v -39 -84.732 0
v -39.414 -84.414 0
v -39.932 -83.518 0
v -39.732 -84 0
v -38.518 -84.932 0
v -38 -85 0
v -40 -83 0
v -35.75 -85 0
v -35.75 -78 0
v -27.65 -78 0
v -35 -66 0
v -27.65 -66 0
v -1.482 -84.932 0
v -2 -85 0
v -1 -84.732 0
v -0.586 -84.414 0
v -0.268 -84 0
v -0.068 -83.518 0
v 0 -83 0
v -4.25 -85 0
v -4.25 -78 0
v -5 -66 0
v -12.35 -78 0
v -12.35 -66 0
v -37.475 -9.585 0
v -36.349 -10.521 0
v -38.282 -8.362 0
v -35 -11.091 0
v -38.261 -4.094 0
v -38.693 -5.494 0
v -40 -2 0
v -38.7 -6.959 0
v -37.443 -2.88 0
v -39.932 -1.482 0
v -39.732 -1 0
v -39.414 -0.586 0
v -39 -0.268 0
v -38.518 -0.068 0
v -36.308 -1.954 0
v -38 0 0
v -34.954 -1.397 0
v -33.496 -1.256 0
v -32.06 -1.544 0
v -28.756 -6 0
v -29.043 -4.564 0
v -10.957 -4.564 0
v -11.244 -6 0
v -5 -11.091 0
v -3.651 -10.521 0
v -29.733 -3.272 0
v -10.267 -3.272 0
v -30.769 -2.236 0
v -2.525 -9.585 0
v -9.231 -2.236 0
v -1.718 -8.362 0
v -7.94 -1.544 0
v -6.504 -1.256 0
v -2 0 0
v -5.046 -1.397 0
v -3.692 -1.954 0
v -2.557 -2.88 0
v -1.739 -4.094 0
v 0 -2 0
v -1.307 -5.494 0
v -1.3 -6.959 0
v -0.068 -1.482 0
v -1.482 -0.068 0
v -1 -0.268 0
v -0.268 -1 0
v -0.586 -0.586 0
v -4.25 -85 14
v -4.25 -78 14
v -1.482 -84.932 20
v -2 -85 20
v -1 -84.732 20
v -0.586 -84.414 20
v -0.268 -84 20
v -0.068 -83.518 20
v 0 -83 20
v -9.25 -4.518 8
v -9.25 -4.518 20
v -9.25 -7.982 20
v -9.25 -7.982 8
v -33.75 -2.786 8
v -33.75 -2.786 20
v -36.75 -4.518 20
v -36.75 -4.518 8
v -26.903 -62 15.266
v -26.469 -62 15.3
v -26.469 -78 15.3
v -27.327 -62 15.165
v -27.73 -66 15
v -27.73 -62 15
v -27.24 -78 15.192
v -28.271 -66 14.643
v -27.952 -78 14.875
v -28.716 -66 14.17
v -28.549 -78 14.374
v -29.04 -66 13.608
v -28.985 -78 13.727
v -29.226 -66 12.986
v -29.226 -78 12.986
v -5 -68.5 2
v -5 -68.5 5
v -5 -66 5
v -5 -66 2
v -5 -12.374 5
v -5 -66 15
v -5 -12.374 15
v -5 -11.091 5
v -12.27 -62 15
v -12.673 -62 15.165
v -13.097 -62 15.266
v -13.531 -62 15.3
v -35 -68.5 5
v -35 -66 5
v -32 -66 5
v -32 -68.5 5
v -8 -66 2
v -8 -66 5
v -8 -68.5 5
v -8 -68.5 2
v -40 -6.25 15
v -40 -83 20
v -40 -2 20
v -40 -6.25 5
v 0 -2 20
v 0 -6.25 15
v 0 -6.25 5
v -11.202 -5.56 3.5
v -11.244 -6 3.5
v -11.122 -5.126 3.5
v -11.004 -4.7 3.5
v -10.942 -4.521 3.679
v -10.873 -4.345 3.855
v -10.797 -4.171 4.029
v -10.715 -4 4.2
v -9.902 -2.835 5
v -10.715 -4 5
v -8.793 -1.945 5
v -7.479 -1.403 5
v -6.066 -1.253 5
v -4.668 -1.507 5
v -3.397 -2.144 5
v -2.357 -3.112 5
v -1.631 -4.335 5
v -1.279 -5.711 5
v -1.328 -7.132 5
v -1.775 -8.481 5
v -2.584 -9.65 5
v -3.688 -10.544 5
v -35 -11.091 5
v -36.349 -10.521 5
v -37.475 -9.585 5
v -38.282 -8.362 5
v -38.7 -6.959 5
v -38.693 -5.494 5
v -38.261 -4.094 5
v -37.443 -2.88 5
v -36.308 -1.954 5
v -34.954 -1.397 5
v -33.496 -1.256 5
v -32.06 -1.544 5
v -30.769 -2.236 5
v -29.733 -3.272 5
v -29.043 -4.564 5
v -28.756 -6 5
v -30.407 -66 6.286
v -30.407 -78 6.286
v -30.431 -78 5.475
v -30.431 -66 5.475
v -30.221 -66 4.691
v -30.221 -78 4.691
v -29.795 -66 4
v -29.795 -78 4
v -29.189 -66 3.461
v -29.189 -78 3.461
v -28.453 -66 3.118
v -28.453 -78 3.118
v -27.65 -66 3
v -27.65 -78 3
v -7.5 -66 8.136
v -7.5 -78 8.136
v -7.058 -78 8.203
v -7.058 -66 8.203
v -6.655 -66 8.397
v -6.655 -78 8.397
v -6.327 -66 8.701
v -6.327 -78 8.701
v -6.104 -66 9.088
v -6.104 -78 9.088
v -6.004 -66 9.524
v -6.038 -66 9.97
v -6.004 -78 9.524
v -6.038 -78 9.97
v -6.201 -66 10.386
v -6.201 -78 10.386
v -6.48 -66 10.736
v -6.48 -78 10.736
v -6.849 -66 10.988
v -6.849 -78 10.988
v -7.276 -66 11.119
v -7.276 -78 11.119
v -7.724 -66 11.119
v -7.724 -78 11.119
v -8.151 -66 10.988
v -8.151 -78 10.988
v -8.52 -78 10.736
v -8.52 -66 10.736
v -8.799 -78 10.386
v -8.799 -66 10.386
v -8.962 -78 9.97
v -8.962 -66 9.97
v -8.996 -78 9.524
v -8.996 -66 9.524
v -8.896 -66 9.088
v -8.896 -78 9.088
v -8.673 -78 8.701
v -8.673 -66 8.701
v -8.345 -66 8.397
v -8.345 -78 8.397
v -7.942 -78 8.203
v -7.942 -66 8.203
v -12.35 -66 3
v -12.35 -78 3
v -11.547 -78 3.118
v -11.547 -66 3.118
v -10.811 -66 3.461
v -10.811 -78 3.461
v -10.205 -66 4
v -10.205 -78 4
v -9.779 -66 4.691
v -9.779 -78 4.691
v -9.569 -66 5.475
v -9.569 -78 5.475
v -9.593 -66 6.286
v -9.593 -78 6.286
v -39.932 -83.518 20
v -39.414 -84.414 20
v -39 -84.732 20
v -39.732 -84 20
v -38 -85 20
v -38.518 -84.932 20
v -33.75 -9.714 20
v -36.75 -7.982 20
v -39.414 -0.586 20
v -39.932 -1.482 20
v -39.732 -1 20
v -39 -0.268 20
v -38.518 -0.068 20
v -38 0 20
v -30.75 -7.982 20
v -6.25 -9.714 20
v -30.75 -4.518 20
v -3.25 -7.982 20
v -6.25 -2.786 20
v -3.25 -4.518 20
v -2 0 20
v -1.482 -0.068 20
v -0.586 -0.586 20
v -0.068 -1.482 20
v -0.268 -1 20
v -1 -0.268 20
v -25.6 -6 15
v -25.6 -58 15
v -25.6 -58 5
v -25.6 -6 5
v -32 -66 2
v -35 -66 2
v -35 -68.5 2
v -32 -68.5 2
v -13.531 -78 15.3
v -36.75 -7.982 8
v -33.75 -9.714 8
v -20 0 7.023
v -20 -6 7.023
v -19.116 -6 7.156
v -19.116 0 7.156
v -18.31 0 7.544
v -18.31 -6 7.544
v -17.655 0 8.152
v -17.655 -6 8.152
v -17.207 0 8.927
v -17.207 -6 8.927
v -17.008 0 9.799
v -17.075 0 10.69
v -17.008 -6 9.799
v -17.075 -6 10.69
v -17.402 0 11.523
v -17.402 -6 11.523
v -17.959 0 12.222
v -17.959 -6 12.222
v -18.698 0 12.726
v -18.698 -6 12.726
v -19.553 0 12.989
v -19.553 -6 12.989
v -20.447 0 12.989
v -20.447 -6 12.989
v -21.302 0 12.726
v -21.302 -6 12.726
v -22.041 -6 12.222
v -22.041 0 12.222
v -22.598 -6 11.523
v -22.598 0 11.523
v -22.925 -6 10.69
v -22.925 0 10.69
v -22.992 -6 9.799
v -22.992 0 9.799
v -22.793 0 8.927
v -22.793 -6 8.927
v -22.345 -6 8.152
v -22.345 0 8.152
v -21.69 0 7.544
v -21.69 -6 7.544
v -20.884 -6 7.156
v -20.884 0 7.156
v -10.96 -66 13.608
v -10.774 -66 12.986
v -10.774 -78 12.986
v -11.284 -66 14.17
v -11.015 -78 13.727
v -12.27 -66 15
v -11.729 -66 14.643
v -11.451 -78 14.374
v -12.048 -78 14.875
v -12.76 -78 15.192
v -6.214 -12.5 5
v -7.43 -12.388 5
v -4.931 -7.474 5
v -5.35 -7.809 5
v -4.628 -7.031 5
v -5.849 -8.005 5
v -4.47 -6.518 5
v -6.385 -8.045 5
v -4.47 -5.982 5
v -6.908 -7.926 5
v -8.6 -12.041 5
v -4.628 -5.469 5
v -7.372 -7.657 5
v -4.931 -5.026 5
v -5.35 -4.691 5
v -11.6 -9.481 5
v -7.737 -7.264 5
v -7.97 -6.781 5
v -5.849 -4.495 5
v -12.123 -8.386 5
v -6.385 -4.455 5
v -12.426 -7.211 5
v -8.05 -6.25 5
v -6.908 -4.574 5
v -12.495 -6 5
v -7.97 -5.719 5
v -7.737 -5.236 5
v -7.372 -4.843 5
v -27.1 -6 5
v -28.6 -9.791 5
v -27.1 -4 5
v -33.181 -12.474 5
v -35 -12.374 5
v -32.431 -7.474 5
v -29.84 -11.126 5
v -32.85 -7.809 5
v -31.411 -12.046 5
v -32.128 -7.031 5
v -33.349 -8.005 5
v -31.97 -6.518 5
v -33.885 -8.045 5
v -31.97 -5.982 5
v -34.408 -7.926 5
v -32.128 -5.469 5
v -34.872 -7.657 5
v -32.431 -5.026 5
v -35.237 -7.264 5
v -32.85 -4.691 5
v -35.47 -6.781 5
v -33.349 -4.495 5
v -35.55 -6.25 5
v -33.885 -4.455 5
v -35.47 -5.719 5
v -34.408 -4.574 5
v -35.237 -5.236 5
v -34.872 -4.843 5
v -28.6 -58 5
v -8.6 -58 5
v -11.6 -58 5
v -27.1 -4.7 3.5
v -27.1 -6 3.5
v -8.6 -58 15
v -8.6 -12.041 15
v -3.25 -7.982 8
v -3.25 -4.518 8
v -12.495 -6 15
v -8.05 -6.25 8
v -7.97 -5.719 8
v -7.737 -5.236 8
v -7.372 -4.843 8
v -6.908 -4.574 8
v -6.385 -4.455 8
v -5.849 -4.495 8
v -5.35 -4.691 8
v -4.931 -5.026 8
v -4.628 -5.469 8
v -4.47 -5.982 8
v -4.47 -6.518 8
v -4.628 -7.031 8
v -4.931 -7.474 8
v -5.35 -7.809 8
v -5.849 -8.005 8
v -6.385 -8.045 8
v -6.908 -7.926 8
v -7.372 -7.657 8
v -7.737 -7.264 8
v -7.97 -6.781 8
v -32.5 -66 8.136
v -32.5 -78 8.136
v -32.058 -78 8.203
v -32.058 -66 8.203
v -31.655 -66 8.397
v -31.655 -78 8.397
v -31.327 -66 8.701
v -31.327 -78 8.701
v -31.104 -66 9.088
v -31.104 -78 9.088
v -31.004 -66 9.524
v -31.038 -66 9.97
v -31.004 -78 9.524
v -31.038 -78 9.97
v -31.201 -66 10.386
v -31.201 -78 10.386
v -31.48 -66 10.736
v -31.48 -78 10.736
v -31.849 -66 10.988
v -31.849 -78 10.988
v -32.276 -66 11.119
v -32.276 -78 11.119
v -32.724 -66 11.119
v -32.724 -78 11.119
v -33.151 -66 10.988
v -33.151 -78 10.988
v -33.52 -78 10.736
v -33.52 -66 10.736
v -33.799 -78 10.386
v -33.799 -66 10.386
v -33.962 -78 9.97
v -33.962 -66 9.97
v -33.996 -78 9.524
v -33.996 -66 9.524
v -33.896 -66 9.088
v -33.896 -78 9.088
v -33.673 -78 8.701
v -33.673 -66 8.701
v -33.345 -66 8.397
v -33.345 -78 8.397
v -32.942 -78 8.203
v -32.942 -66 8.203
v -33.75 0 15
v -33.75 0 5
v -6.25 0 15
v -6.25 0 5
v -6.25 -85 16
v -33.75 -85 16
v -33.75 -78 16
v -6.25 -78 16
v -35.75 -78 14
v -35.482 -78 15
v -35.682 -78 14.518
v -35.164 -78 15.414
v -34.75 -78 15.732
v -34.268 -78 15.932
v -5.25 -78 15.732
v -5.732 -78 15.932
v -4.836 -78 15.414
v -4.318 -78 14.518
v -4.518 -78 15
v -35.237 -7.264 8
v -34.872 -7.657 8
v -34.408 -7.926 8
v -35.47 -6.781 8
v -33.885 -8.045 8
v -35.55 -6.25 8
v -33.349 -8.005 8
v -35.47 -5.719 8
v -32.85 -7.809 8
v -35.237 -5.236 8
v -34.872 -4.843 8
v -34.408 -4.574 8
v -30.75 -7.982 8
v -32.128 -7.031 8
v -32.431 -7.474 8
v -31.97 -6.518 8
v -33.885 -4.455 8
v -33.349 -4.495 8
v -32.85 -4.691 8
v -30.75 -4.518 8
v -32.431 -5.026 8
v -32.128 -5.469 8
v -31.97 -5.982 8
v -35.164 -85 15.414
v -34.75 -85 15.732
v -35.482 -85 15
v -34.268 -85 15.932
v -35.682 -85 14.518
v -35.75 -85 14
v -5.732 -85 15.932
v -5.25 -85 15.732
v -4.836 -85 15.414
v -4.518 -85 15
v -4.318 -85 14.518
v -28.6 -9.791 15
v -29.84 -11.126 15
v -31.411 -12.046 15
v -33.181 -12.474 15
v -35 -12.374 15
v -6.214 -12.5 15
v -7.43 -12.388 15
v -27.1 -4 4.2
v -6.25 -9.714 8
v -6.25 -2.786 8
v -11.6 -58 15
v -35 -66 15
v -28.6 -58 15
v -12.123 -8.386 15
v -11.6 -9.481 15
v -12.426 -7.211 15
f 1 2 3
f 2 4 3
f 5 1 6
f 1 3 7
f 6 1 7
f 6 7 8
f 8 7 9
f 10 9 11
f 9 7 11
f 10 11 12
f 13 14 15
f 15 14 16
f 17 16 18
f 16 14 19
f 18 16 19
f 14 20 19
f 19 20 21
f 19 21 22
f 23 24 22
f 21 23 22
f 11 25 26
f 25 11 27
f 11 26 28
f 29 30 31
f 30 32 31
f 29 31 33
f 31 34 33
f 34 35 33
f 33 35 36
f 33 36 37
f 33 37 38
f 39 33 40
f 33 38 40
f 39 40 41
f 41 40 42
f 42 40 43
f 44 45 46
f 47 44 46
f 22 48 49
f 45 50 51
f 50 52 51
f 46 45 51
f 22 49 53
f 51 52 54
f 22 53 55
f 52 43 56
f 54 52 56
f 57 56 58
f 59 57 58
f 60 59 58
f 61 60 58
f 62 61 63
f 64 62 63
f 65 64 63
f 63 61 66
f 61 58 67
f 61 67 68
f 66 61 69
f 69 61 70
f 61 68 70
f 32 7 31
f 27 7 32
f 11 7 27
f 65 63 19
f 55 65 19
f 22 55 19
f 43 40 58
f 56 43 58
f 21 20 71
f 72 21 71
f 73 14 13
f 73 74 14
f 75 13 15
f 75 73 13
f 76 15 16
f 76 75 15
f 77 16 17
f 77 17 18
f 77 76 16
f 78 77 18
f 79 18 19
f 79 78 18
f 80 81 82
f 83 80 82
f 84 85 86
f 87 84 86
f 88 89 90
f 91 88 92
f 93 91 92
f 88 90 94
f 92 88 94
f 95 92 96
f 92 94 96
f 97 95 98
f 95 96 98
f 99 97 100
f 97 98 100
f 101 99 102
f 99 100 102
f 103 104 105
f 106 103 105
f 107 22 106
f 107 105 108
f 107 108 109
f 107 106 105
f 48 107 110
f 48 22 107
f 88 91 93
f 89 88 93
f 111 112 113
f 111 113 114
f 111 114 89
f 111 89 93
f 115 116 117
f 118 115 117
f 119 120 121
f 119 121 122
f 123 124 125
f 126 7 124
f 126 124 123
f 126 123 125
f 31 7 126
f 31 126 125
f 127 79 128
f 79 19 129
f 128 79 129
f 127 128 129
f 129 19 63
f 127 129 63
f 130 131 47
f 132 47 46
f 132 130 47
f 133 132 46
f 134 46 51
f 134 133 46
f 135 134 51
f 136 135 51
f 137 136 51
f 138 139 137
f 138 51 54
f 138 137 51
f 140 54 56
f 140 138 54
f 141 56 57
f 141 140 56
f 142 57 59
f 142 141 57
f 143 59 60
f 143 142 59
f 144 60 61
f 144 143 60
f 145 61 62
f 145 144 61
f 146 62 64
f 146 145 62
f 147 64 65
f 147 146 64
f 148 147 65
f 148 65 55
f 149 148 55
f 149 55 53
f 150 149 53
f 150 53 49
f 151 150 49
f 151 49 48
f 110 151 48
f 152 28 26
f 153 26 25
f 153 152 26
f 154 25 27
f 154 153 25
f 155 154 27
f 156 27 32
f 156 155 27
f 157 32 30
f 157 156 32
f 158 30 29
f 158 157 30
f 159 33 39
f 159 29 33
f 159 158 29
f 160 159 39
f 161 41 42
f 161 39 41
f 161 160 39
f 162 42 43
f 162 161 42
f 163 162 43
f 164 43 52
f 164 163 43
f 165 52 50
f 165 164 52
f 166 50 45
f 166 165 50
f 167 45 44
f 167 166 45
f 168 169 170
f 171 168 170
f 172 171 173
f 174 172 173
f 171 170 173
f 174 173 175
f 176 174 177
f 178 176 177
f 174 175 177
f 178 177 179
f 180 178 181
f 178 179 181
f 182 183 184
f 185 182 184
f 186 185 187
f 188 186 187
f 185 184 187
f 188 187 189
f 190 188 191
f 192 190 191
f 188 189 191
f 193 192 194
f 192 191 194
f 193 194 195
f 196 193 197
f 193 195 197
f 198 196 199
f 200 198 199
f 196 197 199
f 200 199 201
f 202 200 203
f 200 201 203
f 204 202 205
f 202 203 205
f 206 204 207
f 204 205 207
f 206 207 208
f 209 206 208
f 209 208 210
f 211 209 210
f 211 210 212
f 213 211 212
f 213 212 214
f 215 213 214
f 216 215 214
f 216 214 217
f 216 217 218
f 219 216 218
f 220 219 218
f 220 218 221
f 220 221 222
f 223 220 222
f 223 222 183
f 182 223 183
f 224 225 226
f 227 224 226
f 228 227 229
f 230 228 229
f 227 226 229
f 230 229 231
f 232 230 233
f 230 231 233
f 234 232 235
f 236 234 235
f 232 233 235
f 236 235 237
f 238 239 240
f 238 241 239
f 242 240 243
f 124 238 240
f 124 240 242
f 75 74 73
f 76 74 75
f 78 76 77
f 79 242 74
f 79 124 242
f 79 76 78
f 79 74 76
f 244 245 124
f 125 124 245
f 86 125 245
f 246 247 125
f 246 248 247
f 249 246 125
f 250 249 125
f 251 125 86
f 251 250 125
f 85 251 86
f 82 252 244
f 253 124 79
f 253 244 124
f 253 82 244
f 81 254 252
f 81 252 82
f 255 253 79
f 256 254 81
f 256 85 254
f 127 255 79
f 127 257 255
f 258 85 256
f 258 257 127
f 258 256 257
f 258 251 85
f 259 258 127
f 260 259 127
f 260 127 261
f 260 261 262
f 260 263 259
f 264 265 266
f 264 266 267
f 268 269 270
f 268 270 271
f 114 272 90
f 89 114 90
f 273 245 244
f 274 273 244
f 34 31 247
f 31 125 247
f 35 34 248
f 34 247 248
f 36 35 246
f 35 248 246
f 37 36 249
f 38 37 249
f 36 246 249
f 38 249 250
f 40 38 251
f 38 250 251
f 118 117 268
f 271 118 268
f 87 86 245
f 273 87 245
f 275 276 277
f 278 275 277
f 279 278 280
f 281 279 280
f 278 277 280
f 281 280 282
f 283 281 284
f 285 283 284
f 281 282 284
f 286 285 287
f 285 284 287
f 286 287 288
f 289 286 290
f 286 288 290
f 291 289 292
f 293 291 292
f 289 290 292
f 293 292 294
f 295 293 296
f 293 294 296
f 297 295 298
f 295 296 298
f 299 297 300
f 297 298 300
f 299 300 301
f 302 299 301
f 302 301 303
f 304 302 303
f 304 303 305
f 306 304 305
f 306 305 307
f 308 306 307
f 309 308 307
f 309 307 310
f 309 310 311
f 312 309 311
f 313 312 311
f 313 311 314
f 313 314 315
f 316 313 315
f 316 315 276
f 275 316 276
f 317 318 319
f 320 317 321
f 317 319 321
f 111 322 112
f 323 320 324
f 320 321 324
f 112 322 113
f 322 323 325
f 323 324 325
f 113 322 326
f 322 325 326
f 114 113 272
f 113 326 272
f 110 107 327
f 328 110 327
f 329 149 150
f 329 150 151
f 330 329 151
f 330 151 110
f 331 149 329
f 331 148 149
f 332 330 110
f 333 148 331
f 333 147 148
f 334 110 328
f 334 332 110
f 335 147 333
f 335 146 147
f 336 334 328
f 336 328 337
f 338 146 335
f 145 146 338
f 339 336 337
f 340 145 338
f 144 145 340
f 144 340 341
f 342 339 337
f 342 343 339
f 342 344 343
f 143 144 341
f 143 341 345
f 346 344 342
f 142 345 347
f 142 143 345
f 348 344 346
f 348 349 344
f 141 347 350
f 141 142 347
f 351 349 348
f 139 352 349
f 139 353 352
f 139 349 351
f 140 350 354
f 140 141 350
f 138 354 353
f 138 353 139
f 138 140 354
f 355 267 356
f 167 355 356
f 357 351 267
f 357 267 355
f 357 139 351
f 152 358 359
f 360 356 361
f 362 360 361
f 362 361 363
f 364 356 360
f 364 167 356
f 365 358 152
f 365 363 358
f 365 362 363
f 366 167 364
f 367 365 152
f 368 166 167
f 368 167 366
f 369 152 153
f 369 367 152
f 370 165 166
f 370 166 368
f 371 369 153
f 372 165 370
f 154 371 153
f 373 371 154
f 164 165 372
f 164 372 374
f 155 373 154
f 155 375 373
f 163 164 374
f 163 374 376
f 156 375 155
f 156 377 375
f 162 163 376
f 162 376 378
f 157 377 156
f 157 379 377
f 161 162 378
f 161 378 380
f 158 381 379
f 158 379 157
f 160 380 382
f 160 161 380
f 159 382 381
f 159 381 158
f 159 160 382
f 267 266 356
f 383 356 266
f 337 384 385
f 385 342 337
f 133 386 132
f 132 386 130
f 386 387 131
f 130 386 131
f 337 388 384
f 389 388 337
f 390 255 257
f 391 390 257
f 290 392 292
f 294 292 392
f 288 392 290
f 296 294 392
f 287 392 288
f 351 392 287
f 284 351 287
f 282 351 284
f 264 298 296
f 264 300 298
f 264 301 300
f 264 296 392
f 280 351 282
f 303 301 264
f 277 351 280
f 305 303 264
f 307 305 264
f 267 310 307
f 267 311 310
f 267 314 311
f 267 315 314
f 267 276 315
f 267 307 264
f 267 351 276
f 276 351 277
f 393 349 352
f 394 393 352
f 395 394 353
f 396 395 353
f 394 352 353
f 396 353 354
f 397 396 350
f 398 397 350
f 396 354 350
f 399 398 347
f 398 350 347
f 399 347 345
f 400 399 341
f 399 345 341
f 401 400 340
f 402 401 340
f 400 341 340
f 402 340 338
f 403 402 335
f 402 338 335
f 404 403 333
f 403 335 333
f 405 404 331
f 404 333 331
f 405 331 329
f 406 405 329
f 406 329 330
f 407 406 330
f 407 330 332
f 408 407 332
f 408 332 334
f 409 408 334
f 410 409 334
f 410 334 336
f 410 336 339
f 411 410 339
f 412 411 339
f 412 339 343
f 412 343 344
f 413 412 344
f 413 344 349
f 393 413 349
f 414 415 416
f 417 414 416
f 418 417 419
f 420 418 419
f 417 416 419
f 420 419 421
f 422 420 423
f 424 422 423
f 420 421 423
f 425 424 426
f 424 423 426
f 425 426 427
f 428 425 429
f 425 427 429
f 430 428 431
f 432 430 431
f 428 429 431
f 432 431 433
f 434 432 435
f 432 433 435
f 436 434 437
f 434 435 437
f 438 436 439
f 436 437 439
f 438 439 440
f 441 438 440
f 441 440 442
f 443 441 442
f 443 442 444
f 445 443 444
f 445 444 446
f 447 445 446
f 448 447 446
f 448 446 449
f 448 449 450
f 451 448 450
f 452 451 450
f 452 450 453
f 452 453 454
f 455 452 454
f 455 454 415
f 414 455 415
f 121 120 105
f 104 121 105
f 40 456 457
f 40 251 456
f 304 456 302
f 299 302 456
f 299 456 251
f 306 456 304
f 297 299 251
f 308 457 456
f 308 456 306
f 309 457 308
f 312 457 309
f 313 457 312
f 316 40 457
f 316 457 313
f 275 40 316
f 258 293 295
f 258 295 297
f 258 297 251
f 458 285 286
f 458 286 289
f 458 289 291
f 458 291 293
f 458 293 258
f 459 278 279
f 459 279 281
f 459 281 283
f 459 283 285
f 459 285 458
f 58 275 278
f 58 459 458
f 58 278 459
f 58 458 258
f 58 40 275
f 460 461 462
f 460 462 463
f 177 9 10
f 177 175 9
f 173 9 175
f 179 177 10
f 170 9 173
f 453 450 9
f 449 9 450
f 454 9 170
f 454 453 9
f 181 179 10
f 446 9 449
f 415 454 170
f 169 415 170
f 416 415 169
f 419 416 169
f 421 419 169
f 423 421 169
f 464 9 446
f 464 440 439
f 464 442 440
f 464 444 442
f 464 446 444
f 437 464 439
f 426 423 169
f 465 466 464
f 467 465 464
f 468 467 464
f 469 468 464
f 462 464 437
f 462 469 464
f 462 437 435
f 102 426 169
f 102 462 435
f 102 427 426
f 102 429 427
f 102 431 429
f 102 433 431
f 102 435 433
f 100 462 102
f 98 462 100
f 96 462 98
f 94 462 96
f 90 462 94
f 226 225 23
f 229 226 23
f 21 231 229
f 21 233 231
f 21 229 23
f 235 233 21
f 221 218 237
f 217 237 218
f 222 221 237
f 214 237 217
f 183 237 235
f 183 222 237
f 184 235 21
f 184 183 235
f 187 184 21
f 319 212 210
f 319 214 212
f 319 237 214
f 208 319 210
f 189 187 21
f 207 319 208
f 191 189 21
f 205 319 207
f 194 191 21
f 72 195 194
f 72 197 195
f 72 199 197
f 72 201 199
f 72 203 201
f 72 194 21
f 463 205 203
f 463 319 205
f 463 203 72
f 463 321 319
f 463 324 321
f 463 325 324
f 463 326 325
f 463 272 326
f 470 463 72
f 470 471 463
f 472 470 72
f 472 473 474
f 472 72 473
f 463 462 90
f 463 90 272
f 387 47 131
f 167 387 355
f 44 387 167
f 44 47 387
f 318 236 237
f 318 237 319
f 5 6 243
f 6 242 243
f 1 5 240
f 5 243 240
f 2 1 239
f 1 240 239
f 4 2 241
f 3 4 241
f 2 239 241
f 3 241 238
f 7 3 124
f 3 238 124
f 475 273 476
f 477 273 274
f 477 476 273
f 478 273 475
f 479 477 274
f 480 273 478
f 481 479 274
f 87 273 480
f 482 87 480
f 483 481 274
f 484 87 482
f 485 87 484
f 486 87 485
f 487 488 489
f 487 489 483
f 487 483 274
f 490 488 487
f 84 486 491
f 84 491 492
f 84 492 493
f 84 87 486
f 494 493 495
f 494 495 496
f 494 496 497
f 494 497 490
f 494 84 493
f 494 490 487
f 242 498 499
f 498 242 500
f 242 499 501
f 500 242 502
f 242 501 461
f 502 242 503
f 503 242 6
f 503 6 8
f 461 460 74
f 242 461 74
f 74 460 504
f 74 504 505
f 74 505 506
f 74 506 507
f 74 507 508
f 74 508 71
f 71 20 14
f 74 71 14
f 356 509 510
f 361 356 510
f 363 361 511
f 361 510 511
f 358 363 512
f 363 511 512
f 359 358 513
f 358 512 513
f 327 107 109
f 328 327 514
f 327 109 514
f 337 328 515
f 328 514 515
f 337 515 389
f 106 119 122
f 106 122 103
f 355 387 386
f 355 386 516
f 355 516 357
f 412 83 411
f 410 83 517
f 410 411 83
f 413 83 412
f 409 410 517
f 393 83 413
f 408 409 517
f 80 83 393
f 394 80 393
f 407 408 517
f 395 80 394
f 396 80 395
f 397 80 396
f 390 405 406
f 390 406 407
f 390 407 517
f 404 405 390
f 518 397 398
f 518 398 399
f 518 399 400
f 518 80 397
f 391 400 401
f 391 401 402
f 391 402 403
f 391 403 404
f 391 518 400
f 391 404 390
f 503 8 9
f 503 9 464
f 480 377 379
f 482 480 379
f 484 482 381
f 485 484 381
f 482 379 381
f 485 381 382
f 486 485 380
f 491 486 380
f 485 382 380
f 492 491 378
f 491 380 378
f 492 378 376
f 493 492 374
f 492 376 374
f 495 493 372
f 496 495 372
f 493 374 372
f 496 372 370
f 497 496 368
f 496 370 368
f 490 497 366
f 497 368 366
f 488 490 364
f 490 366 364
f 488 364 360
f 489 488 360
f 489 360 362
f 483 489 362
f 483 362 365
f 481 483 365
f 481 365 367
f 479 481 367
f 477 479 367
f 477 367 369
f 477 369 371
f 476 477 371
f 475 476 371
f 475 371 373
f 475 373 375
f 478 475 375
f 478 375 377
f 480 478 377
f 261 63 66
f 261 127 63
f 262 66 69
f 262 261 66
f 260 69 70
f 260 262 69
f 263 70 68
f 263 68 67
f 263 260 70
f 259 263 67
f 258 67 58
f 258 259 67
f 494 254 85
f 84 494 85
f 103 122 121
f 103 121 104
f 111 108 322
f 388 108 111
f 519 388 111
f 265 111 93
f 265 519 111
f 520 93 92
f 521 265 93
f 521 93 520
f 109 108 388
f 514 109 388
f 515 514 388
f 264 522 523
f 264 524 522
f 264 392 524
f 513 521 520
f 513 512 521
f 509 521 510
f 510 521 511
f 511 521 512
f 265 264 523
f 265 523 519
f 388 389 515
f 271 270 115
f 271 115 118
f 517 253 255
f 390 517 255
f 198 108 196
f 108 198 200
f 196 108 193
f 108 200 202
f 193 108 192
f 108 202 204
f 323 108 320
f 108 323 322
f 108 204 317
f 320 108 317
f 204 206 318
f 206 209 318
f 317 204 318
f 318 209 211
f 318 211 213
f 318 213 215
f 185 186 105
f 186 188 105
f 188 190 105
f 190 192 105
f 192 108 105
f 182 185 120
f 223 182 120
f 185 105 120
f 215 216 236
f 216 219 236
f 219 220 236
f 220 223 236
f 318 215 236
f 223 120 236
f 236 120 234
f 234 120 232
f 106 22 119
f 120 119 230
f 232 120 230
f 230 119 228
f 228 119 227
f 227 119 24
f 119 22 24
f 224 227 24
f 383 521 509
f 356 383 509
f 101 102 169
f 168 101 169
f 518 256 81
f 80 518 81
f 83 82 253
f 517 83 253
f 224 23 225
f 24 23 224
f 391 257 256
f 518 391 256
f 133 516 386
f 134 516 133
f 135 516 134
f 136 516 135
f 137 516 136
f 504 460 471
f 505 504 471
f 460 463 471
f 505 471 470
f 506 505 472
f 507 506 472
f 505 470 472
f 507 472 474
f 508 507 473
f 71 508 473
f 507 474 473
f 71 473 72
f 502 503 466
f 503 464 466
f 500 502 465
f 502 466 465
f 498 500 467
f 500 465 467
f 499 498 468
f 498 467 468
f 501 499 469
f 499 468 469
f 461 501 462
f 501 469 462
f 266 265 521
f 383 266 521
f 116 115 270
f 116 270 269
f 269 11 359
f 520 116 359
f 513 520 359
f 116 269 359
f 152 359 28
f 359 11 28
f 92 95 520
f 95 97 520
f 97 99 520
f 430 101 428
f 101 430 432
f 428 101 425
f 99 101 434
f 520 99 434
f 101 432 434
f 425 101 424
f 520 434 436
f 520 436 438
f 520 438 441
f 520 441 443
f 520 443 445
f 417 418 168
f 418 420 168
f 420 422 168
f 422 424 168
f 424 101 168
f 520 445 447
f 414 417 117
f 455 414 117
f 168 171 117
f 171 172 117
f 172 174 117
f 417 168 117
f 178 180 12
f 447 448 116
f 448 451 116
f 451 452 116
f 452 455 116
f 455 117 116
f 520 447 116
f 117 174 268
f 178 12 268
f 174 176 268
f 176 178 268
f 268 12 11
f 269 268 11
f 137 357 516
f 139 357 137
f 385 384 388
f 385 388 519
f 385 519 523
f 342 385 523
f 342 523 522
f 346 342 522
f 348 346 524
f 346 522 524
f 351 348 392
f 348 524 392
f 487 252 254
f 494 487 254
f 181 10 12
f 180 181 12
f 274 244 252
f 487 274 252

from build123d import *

# Parameters (mm, degrees)
SKETCH_1_W           = 40
SKETCH_1_H           = 85
EXTRUDE_1_DEPTH      = 20
SKETCH_2_W           = 30
SKETCH_2_H           = 60
CUT_EXTRUDE_1_DEPTH  = 15
SKETCH_3_W           = 31.5
SKETCH_3_H           = 16
CUT_EXTRUDE_3_DEPTH  = 7
SKETCH_4_R           = 1.5
CUT_EXTRUDE_4_DEPTH  = 16
FILLET_1_R           = 2
FILLET_2_R           = 2
SKETCH_6_W           = 15.3
SKETCH_6_H           = 12
CUT_EXTRUDE_5_DEPTH  = 4
SKETCH_7_W           = 3
SKETCH_7_H           = 52
EXTRUDE_2_DEPTH      = 10
SKETCH_8_W           = 17
SKETCH_8_H           = 1.5
CUT_EXTRUDE_6_DEPTH  = 2
CHAMFER_1_SIZE       = 0.7
SKETCH_9_R           = 3
CUT_EXTRUDE_7_DEPTH  = 15
SKETCH_10_W          = 3
SKETCH_10_H          = 3
CUT_EXTRUDE_8_DEPTH  = 2.5
EXTRUDE_START        = -15
SKETCH_14_R          = 6.25
EXTRUDE_4_DEPTH      = 10
CUT_EXTRUDE_START    = -5
SKETCH_16_R          = 5
CUT_EXTRUDE_10_DEPTH = 5
SKETCH_17_R          = 1.8
CUT_EXTRUDE_11_DEPTH = 96.131487952
CUT_EXTRUDE_12_DEPTH = 12


with BuildPart() as part:
    # Эскиз1 → Бобышка-Вытянуть1 (new body)
    with BuildSketch(Plane.XY):
        with Locations((-20, -42.5)):
            Rectangle(SKETCH_1_W, SKETCH_1_H)
    extrude(amount=EXTRUDE_1_DEPTH)

    # Эскиз2 → Вырез-Вытянуть1 (cut)
    with BuildSketch(Plane(origin=(0, 0, 0), x_dir=(-1, 0, 0), z_dir=(0, 0, -1))):
        with Locations((20, -36)):
            Rectangle(SKETCH_2_W, SKETCH_2_H)
    extrude(amount=-CUT_EXTRUDE_1_DEPTH, mode=Mode.SUBTRACT)

    # Эскиз3 → Вырез-Вытянуть3 (cut)
    with BuildSketch(Plane.XZ.offset(85)):
        with Locations((-20, 8)):
            Rectangle(SKETCH_3_W, SKETCH_3_H)
    extrude(amount=-CUT_EXTRUDE_3_DEPTH, mode=Mode.SUBTRACT)

    # Эскиз4 → Вырез-Вытянуть4 (cut)
    with BuildSketch(Plane.XZ.offset(78)):
        with Locations(Location((-7.5, 9.636214897, 0), (0, 0, 270))):
            Circle(SKETCH_4_R)
        with Locations(Location((-32.5, 9.636214897, 0), (0, 0, 270))):
            Circle(SKETCH_4_R)
        with BuildLine():
            Line((-13.531390771, 15.3), (-26.468609229, 15.3))
            ThreePointArc((-26.468609229, 15.3), (-28.268414536, 14.644924441), (-29.226070938, 12.986214897))
            Line((-29.226070938, 12.986214897), (-30.407461708, 6.286214897))
            ThreePointArc((-30.407461708, 6.286214897), (-29.794924441, 4.000194693), (-27.65, 3))
            Line((-27.65, 3), (-12.35, 3))
            ThreePointArc((-12.35, 3), (-10.205075559, 4.000194693), (-9.592538292, 6.286214897))
            Line((-9.592538292, 6.286214897), (-10.773929062, 12.986214897))
            ThreePointArc((-10.773929062, 12.986214897), (-11.731585464, 14.644924441), (-13.531390771, 15.3))
        make_face()
    extrude(amount=-CUT_EXTRUDE_4_DEPTH, mode=Mode.SUBTRACT)

    # Скругление1
    fillet_1_edges = [part.edges().sort_by_distance(p)[0] for p in [
        (-4.25, -81.5, 16),
        (-35.75, -81.5, 16),
    ]]
    fillet(fillet_1_edges, radius=FILLET_1_R)

    # Скругление2
    fillet_2_edges = [part.edges().sort_by_distance(p)[0] for p in [
        (0, -85, 10),
        (-40, -85, 10),
        (-40, 0, 10),
        (0, 0, 10),
    ]]
    fillet(fillet_2_edges, radius=FILLET_2_R)

    # Эскиз6 → Вырез-Вытянуть5 (cut)
    with BuildSketch(Plane(origin=(0, 0, 0), x_dir=(-1, 0, 0), z_dir=(0, 0, -1))):
        with Locations((20, -72)):
            Rectangle(SKETCH_6_W, SKETCH_6_H)
    extrude(amount=-CUT_EXTRUDE_5_DEPTH, mode=Mode.SUBTRACT)

    # Эскиз7 → Бобышка-Вытянуть2 (add)
    with BuildSketch(Plane(origin=(0, 0, 15), x_dir=(-1, 0, 0), z_dir=(0, 0, -1))):
        with Locations((10.1, -32)):
            Rectangle(SKETCH_7_W, SKETCH_7_H)
        with Locations((27.1, -32)):
            Rectangle(SKETCH_7_W, SKETCH_7_H)
    extrude(amount=EXTRUDE_2_DEPTH)

    # Эскиз8 → Вырез-Вытянуть6 (cut)
    with BuildSketch(Plane.XZ.offset(6)):
        with Locations((-18.6, 4.25)):
            Rectangle(SKETCH_8_W, SKETCH_8_H)
    extrude(amount=-CUT_EXTRUDE_6_DEPTH, mode=Mode.SUBTRACT)

    # Фаска1
    chamfer_1_edges = [part.edges().sort_by_distance(p)[0] for p in [
        (-18.6, -4, 3.5),
    ]]
    chamfer(chamfer_1_edges, length=CHAMFER_1_SIZE)

    # Эскиз9 → Вырез-Вытянуть7 (cut)
    with BuildSketch(Plane.XZ.offset(6)):
        with Locations(Location((-20, 10.022807371, 0), (0, 0, 270))):
            Circle(SKETCH_9_R)
    extrude(amount=-CUT_EXTRUDE_7_DEPTH, mode=Mode.SUBTRACT)

    # Эскиз10 → Вырез-Вытянуть8 (cut)
    with BuildSketch(Plane(origin=(0, -66, 0), x_dir=(1, 0, 0), z_dir=(0, 1, 0))):
        with Locations((-33.5, -3.5)):
            Rectangle(SKETCH_10_W, SKETCH_10_H)
        with Locations((-6.5, -3.5)):
            Rectangle(SKETCH_10_W, SKETCH_10_H)
    extrude(amount=-CUT_EXTRUDE_8_DEPTH, mode=Mode.SUBTRACT)

    # Эскиз14 → Бобышка-Вытянуть4 (add)
    with BuildSketch(Plane(origin=(0, 0, 0), x_dir=(-1, 0, 0), z_dir=(0, 0, -1)).offset(EXTRUDE_START)):
        with Locations((6.25, -6.25)):
            Circle(SKETCH_14_R)
        with Locations((33.75, -6.25)):
            Circle(SKETCH_14_R)
    extrude(amount=EXTRUDE_4_DEPTH)

    # Эскиз16 → Вырез-Вытянуть10 (cut)
    with BuildSketch(Plane(origin=(0, 0, 0), x_dir=(-1, 0, 0), z_dir=(0, 0, -1)).offset(CUT_EXTRUDE_START)):
        with Locations((6.25, -6.25)):
            Circle(SKETCH_16_R)
        with Locations((33.75, -6.25)):
            Circle(SKETCH_16_R)
    extrude(amount=CUT_EXTRUDE_10_DEPTH, mode=Mode.SUBTRACT)

    # Эскиз17 → Вырез-Вытянуть11 (cut, through all)
    with BuildSketch(Plane(origin=(0, 0, 5), x_dir=(-1, 0, 0), z_dir=(0, 0, -1))):
        with Locations((6.25, -6.25)):
            Circle(SKETCH_17_R)
        with Locations((33.75, -6.25)):
            Circle(SKETCH_17_R)
    extrude(amount=-CUT_EXTRUDE_11_DEPTH, mode=Mode.SUBTRACT)

    # Эскиз18 → Вырез-Вытянуть12 (cut)
    with BuildSketch(Plane.XY.offset(20)):
        Polygon((-6.25, -9.714101615), (-3.25, -7.982050808), (-3.25, -4.517949192), (-6.25, -2.785898385), (-9.25, -4.517949192), (-9.25, -7.982050808), align=None)
        Polygon((-30.75, -4.517949192), (-33.75, -2.785898385), (-36.75, -4.517949192), (-36.75, -7.982050808), (-33.75, -9.714101615), (-30.75, -7.982050808), align=None)
    extrude(amount=-CUT_EXTRUDE_12_DEPTH, mode=Mode.SUBTRACT)


solid = part.part
